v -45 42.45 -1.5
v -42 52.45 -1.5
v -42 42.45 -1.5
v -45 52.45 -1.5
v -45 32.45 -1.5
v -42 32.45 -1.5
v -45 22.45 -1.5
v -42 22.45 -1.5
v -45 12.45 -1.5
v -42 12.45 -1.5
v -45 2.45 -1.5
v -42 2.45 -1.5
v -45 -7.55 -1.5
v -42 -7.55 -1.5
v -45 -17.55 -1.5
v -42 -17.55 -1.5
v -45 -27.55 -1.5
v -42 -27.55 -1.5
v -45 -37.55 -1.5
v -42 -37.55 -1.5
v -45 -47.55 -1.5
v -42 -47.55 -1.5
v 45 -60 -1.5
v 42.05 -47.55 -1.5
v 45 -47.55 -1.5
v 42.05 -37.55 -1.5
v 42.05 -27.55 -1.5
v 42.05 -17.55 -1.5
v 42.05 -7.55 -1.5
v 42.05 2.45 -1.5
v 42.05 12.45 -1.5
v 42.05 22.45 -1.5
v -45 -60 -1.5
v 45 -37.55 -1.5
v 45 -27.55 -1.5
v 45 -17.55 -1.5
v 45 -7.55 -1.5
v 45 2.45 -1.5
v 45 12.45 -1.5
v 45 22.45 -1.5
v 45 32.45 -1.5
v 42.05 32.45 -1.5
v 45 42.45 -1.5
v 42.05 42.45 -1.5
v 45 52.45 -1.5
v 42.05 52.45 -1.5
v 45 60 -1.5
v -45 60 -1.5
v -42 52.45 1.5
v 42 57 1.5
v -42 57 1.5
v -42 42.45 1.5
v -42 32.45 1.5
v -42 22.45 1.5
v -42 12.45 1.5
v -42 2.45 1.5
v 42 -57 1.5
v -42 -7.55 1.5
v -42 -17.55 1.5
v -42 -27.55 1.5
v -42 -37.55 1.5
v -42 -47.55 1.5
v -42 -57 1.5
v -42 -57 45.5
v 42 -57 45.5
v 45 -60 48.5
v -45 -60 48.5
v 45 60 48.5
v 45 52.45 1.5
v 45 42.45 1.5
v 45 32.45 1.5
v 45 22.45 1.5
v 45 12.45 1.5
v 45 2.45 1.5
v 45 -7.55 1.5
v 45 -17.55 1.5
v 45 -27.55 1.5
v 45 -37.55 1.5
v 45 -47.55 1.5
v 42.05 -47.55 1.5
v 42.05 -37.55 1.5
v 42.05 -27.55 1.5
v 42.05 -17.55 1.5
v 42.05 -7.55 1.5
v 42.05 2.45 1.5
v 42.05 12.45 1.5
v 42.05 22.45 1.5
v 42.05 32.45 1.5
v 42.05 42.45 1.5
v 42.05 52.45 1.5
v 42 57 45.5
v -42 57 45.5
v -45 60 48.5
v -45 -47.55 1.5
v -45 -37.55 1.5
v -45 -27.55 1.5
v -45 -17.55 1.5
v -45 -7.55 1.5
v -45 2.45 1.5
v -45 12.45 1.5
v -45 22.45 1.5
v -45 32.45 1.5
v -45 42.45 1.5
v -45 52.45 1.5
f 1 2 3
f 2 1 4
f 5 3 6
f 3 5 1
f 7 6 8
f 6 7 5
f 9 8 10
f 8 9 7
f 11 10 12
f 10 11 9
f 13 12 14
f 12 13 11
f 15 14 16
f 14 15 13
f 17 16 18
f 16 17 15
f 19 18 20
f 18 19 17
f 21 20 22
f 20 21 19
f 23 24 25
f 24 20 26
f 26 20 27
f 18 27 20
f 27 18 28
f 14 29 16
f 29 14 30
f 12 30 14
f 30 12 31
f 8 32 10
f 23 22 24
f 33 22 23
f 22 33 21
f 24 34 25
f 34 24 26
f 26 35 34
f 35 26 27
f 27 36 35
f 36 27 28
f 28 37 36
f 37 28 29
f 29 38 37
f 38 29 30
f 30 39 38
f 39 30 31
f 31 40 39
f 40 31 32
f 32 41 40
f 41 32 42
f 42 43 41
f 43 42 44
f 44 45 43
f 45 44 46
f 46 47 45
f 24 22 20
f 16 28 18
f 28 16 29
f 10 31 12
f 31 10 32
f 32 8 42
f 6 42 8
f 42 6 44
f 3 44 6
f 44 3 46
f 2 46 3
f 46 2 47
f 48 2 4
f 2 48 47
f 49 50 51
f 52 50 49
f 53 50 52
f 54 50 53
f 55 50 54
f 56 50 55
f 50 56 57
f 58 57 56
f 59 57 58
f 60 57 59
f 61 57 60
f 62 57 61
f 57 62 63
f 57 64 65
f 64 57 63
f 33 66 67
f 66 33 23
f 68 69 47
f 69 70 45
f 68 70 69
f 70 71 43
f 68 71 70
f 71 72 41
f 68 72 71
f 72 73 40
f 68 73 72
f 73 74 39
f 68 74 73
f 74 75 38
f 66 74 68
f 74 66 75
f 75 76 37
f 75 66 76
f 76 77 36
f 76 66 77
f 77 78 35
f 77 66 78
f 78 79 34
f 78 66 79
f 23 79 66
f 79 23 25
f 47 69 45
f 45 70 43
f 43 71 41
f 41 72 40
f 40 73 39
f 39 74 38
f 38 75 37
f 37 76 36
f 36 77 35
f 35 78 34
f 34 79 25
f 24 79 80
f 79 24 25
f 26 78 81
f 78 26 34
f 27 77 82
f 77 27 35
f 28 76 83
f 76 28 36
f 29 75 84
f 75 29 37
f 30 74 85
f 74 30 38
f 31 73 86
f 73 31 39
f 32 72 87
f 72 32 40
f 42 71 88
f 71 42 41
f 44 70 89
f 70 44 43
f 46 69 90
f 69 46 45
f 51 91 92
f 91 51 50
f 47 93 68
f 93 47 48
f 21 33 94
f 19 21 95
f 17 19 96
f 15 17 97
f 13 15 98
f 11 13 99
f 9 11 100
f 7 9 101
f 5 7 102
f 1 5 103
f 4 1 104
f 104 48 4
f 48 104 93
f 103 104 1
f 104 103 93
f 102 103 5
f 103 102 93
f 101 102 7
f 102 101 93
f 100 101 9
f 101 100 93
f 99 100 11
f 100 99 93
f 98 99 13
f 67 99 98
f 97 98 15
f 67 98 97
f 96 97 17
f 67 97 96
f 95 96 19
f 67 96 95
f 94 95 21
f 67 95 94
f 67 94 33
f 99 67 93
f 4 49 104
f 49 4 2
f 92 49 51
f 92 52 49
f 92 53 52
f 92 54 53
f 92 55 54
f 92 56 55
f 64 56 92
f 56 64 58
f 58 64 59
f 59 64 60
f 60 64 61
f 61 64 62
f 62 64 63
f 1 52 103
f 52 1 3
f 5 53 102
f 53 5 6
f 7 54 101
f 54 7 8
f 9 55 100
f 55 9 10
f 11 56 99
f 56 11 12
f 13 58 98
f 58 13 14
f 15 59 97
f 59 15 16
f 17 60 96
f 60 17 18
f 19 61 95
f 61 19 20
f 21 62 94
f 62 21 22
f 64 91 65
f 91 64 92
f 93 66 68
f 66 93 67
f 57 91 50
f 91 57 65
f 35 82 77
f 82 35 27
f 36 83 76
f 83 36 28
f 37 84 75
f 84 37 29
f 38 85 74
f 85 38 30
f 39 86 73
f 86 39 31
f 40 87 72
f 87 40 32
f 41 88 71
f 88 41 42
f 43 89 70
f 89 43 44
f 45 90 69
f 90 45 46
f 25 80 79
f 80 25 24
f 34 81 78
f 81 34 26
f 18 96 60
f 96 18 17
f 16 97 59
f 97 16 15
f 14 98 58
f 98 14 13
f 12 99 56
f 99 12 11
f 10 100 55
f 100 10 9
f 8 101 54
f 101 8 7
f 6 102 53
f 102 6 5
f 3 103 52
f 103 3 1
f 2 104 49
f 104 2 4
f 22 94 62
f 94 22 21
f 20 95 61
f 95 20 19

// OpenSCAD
/*
Create a laser cut box with finger joints
Released under the Creative Commons Attribution License
Some Rights Reserved: aaron . ciuffo 2 gmail.com

Version 2.5 18 September 2014
  * merged changes from 2.4 to allow different cut width on lid

Version 2.4 15 September 2014
  * variable cut width on lid
  * implementation is broken because uDiv is calculated from cutW, not cutWlid

Version 2.3 15 September 2014
  * partial rewrite of modules to make more parametric

*/

/* [Box OUTSIDE Dimensions] */
//Box Width (X)
bX=90;
//Box Depth (Y)
bY=120;
//Box Height (Z)
bZ=50;
//Material Thickness
cutD=3;
//include a lid?
addLid=1; //[1:Lid, 0:No Lid]

/* [Finger Width] */
//Finger  width (cutW < 1/3 shortest side)
cutW=5;//[3:20]
//Finger width on lid (cutWlid < 1/3 shorter of X/Y dimension)
cutWlid=25;//[3:30]
//Laser kerf (1/2 inside, 1/2 outside of laser path)
kerf=0.1;

/* [Layout] */
//separation of finished pieces
separation=1;
//transparency of 3D model
alpha=50; //[1:100]
//2D or 3D Layout
2D=0; //[1:2D for DXF, 0:3D for STL]



/* [Hidden] */
//Calculate the maximum number of tabs and slots
maxDivX=floor(bX/cutW);
maxDivY=floor(bY/cutW);
maxDivZ=floor(bZ/cutW);

//NB! the maximum usable divisions MUST be odd
uDivX= (maxDivX%2)==0 ? maxDivX-3 : maxDivX-2;
uDivY= (maxDivY%2)==0 ? maxDivY-3 : maxDivY-2;
uDivZ= (maxDivZ%2)==0 ? maxDivZ-3 : maxDivZ-2;

alp=1-alpha/100;


//cuts that fall completely insde the edges
module insideCuts(len, cutWidth, cutDepth, uDiv, lKerf=0.1) {

  //Calculate the number of tabs and slots
  numTabs=floor(uDiv/2);
  numSlots=ceil(uDiv/2);

  //draw out rectangles for slots
  for (i=[0:numSlots-1]) {
    translate([i*(cutWidth*2)+lKerf/2, 0, 0])
      square([cutWidth-lKerf, cutDepth]);
  }
}


//cuts that fall at the end of an edge
module outsideCuts(len, cutWidth, cutDepth, uDiv, lKerf=0.1, endCut) {

  numSlots=floor(uDiv/2);

  //padding - sift all the slots by the amount equal to tend cut plus one division
  padding=endCut+cutWidth;

  //first endcut
  square([endCut+lKerf/2, cutD]);

  //draw all the normal slots plus the last endcut
  for (i=[0:numSlots]) {
    if (i < numSlots) {
      translate([i*(cutWidth*2)+padding-lKerf/2, 0, 0])
        square([cutWidth+lKerf, cutDepth]);
    } else {
      translate([i*(cutWidth*2)+padding-lKerf/2, 0, 0])
        square([endCut+lKerf/2, cutDepth]);
    }
  }
}

//Face A (X and Z dimension)
//Front and Back face
module faceA(uDivX, uDivZ, uDivLX) {
  difference() {
    square([bX, bZ], center=true);
    //X+/- edge (X axis in OpenSCAD)
    // if true, make cuts for the lid
    if (addLid) {
      //translate([-uDivX*cutW/2, bZ/2-cutD, 0])
      //  insideCuts(len=bX, cutWidth=cutW, cutDepth=cutD, uDiv=uDivX, lKerf=kerf);
      translate([-uDivLX*cutWlid/2, bZ/2-cutD, 0])
        insideCuts(len=bX, cutWidth=cutWlid, cutDepth=cutD, uDiv=uDivLX, lKerf=kerf);
    }
    translate([-uDivX*cutW/2, -bZ/2, 0])
      insideCuts(len=bX, cutWidth=cutW, cutDepth=cutD, uDiv=uDivX, lKerf=kerf);

    //Z+/- edge (Y axis in OpenSCAD)
    translate([bX/2-cutD+kerf/2, uDivZ*cutW/2, 0]) rotate([0, 0, -90])
      insideCuts(len=bZ, cutWidth=cutW, cutDepth=cutD, uDiv=uDivZ, lKerf=kerf);
    translate([-bX/2, uDivZ*cutW/2, 0]) rotate([0, 0, -90])
      insideCuts(len=bZ, cutWidth=cutW, cutDepth=cutD, uDiv=uDivZ, lKerf=kerf);
  }
}

//Face C (X and Y dimension)
//create a the lid and base
module faceB(uDivX, uDivY, uDivLX, uDivLY, lid=0) {

  
  //if this is the "lid" use cutWlid dimensions instead of cutW
  // create the local version of these variables

  uDivXloc= lid==1 ? uDivLX : uDivX;
  uDivYloc= lid==1 ? uDivLY : uDivY;
  cutWloc=  lid==1 ? cutWlid : cutW;

  /*
  if (lid) {
    uDivXloc=uDivLX;
    uDivYloc=uDivLY;
    cutWloc=cutWlid;
  } else {
    uDivXloc=uDivX;
    uDivYloc=uDivY;
    cutWloc=cutW;
  }*/
  
  endCutX=(bX-uDivXloc*cutWloc)/2;

  difference() {
    square([bX, bY], center=true);
    //X+/- edge (X axis in OpenSCAD)
    translate([(-uDivXloc*cutWloc/2)-endCutX, bY/2-cutD, 0])
    //Original: #translate([(-uDivX*cutW/2)-endCutX, bY/2-cutD+kerf/2, 0])
      outsideCuts(len=bX, cutWidth=cutWloc, cutDepth=cutD, uDiv=uDivXloc,
        lKerf=kerf, endCut=endCutX);
    translate([(-uDivXloc*cutWloc/2)-endCutX, -bY/2, 0])
      outsideCuts(len=bX, cutWidth=cutWloc, cutDepth=cutD, uDiv=uDivXloc,
        lKerf=kerf, endCut=endCutX);

    //Y+/- edge (Y axis in OpenSCAD)
    translate([bX/2-cutD+kerf/2, uDivYloc*cutWloc/2, 0]) rotate([0, 0, -90])
      insideCuts(len=bY, cutWidth=cutWloc, cutDepth=cutD, uDiv=uDivYloc, lKerf=kerf);
    translate([-bX/2, uDivYloc*cutWloc/2, 0]) rotate([0, 0, -90])
      insideCuts(len=bY, cutWidth=cutWloc, cutDepth=cutD, uDiv=uDivYloc, lKerf=kerf);

  }
}


module faceC(uDivY, uDivZ, uDivLY) {
  //amount to cut off at the end of an outside cut edge
  endCutY=(bY-uDivY*cutW)/2;
  endCutZ=(bZ-uDivZ*cutW)/2;
  endCutLY=(bY-uDivLY*cutWlid)/2;

  difference() {
      square([bY, bZ], center=true);
      //Y+/- edge (X axis in OpenSCAD)
      if(addLid) {
        translate([(-uDivLY*cutWlid/2)-endCutLY, bZ/2-cutD, 0])
          outsideCuts(len=bY, cutWidth=cutWlid, cutDepth=cutD, uDiv=uDivLY, lKerf=kerf,
            endCut=endCutLY);
      }
      translate([(-uDivY*cutW/2)-endCutY, -bZ/2, 0])
        outsideCuts(len=bY, cutWidth=cutW, cutDepth=cutD, uDiv=uDivY, lKerf=kerf,
          endCut=endCutY);

      //Z+/- edge (Y axis in OpenSCAD)
      translate([-bY/2, (uDivZ*cutW/2)+endCutZ, 0]) rotate([0, 0, -90])
        outsideCuts(len=bZ, cutWidth=cutW, cutDepth=cutD, uDiv=uDivZ, lKerf=kerf,
          endCut=endCutZ);
      translate([bY/2-cutD+kerf/2, (uDivZ*cutW/2)+endCutZ, 0]) rotate([0, 0, -90])
        outsideCuts(len=bZ, cutWidth=cutW, cutDepth=cutD, uDiv=uDivZ, lKerf=kerf,
          endCut=endCutZ);
    }
}

module layout2D(uDivX, uDivY, uDivZ, uDivLX, uDivLY) {
  translate()
    color("red") faceA(uDivX, uDivZ, uDivLX); 

  if (addLid) {
  translate([0, -bZ/2-bY/2-separation, 0])
    color("green") faceB(uDivX, uDivY, uDivLX, uDivLY, lid=1);
  }
  
  translate([bX/2+bY/2+separation, 0, 0])
    color("blue") faceC(uDivY, uDivZ, uDivLY);

  translate([bX+separation+bY+separation, 0, 0])
    color("darkred") faceA(uDivX, uDivZ, uDivLX);
  
  translate([bX/2+bY/2+separation, -bY, 0])
    color("navy") faceC(uDivY, uDivZ, uDivLY);

  translate([bX+separation+bY+separation, -bZ/2-bY/2-separation, 0])
    color("lime") faceB(uDivX, uDivY, lid=0);
}


module assemble3D(DivX, uDivY, uDivZ, uDivLX, uDivLY, alp=0.5) {
  //amount to shift for cut depth
  D=cutD/2;

  //bottom of box (B-)
  color("lime", alpha=alp)
    linear_extrude(height=cutD, center=true) faceB(uDivX, uDivY, lid=0);

  //lid of box (B+)
  if (addLid) {
  color("green", alpha=alp)
    translate([0, 0, bZ-cutD])
    linear_extrude(height=cutD, center=true) faceB(uDivX, uDivY, uDivLX, uDivLY, lid=1);
  }

  //faceA +/-
  color("red", alpha=alp)
    translate([0, bY/2-D, bZ/2-D]) rotate([90, 0, 0])
    linear_extrude(height=cutD, center=true) faceA(uDivX, uDivZ, uDivLX);
  color("darkred", alpha=alp)
    translate([0, -bY/2+D, bZ/2-D]) rotate([90, 0, 0])
    linear_extrude(height=cutD, center=true) faceA(uDivX, uDivZ, uDivLX);

  //FaceC +/-
  color("blue", alpha=alp)
    translate([bX/2-D, 0, bZ/2-D]) rotate([90, 0, 90])
    linear_extrude(height=cutD, center=true) faceC(uDivY, uDivZ, uDivLY);
  color("navy", alpha=alp)
    translate([-bX/2+D, 0, bZ/2-D]) rotate([90, 0, 90])
    linear_extrude(height=cutD, center=true) faceC(uDivY, uDivZ, uDivLY);
}

module main() {
  //Calculate the maximum number of tabs and slots
  maxDivX=floor(bX/cutW);
  maxDivY=floor(bY/cutW);
  maxDivZ=floor(bZ/cutW);

  // calculate the maximum number of tabs for the lid cut width
  maxDivLX=floor(bX/cutWlid);
  maxDivLY=floor(bY/cutWlid);

  //Usable divisions on the X, Y, Z edges
  //NB! the maximum usable divisions MUST be odd
  uDivX= (maxDivX%2)==0 ? maxDivX-3 : maxDivX-2;
  uDivY= (maxDivY%2)==0 ? maxDivY-3 : maxDivY-2;
  uDivZ= (maxDivZ%2)==0 ? maxDivZ-3 : maxDivZ-2;

  uDivLX= (maxDivLX%2)==0 ? maxDivLX-3 : maxDivLX-2;
  uDivLY= (maxDivLY%2)==0 ? maxDivLY-3 : maxDivLY-2;


  alp=1-alpha/100;

  if (2D) {
    layout2D(uDivX, uDivY, uDivZ, uDivLX, uDivLY); 
  } else {
    assemble3D(uDivX, uDivY, uDivZ, uDivLX, uDivLY, alp);
  }
}


main();
